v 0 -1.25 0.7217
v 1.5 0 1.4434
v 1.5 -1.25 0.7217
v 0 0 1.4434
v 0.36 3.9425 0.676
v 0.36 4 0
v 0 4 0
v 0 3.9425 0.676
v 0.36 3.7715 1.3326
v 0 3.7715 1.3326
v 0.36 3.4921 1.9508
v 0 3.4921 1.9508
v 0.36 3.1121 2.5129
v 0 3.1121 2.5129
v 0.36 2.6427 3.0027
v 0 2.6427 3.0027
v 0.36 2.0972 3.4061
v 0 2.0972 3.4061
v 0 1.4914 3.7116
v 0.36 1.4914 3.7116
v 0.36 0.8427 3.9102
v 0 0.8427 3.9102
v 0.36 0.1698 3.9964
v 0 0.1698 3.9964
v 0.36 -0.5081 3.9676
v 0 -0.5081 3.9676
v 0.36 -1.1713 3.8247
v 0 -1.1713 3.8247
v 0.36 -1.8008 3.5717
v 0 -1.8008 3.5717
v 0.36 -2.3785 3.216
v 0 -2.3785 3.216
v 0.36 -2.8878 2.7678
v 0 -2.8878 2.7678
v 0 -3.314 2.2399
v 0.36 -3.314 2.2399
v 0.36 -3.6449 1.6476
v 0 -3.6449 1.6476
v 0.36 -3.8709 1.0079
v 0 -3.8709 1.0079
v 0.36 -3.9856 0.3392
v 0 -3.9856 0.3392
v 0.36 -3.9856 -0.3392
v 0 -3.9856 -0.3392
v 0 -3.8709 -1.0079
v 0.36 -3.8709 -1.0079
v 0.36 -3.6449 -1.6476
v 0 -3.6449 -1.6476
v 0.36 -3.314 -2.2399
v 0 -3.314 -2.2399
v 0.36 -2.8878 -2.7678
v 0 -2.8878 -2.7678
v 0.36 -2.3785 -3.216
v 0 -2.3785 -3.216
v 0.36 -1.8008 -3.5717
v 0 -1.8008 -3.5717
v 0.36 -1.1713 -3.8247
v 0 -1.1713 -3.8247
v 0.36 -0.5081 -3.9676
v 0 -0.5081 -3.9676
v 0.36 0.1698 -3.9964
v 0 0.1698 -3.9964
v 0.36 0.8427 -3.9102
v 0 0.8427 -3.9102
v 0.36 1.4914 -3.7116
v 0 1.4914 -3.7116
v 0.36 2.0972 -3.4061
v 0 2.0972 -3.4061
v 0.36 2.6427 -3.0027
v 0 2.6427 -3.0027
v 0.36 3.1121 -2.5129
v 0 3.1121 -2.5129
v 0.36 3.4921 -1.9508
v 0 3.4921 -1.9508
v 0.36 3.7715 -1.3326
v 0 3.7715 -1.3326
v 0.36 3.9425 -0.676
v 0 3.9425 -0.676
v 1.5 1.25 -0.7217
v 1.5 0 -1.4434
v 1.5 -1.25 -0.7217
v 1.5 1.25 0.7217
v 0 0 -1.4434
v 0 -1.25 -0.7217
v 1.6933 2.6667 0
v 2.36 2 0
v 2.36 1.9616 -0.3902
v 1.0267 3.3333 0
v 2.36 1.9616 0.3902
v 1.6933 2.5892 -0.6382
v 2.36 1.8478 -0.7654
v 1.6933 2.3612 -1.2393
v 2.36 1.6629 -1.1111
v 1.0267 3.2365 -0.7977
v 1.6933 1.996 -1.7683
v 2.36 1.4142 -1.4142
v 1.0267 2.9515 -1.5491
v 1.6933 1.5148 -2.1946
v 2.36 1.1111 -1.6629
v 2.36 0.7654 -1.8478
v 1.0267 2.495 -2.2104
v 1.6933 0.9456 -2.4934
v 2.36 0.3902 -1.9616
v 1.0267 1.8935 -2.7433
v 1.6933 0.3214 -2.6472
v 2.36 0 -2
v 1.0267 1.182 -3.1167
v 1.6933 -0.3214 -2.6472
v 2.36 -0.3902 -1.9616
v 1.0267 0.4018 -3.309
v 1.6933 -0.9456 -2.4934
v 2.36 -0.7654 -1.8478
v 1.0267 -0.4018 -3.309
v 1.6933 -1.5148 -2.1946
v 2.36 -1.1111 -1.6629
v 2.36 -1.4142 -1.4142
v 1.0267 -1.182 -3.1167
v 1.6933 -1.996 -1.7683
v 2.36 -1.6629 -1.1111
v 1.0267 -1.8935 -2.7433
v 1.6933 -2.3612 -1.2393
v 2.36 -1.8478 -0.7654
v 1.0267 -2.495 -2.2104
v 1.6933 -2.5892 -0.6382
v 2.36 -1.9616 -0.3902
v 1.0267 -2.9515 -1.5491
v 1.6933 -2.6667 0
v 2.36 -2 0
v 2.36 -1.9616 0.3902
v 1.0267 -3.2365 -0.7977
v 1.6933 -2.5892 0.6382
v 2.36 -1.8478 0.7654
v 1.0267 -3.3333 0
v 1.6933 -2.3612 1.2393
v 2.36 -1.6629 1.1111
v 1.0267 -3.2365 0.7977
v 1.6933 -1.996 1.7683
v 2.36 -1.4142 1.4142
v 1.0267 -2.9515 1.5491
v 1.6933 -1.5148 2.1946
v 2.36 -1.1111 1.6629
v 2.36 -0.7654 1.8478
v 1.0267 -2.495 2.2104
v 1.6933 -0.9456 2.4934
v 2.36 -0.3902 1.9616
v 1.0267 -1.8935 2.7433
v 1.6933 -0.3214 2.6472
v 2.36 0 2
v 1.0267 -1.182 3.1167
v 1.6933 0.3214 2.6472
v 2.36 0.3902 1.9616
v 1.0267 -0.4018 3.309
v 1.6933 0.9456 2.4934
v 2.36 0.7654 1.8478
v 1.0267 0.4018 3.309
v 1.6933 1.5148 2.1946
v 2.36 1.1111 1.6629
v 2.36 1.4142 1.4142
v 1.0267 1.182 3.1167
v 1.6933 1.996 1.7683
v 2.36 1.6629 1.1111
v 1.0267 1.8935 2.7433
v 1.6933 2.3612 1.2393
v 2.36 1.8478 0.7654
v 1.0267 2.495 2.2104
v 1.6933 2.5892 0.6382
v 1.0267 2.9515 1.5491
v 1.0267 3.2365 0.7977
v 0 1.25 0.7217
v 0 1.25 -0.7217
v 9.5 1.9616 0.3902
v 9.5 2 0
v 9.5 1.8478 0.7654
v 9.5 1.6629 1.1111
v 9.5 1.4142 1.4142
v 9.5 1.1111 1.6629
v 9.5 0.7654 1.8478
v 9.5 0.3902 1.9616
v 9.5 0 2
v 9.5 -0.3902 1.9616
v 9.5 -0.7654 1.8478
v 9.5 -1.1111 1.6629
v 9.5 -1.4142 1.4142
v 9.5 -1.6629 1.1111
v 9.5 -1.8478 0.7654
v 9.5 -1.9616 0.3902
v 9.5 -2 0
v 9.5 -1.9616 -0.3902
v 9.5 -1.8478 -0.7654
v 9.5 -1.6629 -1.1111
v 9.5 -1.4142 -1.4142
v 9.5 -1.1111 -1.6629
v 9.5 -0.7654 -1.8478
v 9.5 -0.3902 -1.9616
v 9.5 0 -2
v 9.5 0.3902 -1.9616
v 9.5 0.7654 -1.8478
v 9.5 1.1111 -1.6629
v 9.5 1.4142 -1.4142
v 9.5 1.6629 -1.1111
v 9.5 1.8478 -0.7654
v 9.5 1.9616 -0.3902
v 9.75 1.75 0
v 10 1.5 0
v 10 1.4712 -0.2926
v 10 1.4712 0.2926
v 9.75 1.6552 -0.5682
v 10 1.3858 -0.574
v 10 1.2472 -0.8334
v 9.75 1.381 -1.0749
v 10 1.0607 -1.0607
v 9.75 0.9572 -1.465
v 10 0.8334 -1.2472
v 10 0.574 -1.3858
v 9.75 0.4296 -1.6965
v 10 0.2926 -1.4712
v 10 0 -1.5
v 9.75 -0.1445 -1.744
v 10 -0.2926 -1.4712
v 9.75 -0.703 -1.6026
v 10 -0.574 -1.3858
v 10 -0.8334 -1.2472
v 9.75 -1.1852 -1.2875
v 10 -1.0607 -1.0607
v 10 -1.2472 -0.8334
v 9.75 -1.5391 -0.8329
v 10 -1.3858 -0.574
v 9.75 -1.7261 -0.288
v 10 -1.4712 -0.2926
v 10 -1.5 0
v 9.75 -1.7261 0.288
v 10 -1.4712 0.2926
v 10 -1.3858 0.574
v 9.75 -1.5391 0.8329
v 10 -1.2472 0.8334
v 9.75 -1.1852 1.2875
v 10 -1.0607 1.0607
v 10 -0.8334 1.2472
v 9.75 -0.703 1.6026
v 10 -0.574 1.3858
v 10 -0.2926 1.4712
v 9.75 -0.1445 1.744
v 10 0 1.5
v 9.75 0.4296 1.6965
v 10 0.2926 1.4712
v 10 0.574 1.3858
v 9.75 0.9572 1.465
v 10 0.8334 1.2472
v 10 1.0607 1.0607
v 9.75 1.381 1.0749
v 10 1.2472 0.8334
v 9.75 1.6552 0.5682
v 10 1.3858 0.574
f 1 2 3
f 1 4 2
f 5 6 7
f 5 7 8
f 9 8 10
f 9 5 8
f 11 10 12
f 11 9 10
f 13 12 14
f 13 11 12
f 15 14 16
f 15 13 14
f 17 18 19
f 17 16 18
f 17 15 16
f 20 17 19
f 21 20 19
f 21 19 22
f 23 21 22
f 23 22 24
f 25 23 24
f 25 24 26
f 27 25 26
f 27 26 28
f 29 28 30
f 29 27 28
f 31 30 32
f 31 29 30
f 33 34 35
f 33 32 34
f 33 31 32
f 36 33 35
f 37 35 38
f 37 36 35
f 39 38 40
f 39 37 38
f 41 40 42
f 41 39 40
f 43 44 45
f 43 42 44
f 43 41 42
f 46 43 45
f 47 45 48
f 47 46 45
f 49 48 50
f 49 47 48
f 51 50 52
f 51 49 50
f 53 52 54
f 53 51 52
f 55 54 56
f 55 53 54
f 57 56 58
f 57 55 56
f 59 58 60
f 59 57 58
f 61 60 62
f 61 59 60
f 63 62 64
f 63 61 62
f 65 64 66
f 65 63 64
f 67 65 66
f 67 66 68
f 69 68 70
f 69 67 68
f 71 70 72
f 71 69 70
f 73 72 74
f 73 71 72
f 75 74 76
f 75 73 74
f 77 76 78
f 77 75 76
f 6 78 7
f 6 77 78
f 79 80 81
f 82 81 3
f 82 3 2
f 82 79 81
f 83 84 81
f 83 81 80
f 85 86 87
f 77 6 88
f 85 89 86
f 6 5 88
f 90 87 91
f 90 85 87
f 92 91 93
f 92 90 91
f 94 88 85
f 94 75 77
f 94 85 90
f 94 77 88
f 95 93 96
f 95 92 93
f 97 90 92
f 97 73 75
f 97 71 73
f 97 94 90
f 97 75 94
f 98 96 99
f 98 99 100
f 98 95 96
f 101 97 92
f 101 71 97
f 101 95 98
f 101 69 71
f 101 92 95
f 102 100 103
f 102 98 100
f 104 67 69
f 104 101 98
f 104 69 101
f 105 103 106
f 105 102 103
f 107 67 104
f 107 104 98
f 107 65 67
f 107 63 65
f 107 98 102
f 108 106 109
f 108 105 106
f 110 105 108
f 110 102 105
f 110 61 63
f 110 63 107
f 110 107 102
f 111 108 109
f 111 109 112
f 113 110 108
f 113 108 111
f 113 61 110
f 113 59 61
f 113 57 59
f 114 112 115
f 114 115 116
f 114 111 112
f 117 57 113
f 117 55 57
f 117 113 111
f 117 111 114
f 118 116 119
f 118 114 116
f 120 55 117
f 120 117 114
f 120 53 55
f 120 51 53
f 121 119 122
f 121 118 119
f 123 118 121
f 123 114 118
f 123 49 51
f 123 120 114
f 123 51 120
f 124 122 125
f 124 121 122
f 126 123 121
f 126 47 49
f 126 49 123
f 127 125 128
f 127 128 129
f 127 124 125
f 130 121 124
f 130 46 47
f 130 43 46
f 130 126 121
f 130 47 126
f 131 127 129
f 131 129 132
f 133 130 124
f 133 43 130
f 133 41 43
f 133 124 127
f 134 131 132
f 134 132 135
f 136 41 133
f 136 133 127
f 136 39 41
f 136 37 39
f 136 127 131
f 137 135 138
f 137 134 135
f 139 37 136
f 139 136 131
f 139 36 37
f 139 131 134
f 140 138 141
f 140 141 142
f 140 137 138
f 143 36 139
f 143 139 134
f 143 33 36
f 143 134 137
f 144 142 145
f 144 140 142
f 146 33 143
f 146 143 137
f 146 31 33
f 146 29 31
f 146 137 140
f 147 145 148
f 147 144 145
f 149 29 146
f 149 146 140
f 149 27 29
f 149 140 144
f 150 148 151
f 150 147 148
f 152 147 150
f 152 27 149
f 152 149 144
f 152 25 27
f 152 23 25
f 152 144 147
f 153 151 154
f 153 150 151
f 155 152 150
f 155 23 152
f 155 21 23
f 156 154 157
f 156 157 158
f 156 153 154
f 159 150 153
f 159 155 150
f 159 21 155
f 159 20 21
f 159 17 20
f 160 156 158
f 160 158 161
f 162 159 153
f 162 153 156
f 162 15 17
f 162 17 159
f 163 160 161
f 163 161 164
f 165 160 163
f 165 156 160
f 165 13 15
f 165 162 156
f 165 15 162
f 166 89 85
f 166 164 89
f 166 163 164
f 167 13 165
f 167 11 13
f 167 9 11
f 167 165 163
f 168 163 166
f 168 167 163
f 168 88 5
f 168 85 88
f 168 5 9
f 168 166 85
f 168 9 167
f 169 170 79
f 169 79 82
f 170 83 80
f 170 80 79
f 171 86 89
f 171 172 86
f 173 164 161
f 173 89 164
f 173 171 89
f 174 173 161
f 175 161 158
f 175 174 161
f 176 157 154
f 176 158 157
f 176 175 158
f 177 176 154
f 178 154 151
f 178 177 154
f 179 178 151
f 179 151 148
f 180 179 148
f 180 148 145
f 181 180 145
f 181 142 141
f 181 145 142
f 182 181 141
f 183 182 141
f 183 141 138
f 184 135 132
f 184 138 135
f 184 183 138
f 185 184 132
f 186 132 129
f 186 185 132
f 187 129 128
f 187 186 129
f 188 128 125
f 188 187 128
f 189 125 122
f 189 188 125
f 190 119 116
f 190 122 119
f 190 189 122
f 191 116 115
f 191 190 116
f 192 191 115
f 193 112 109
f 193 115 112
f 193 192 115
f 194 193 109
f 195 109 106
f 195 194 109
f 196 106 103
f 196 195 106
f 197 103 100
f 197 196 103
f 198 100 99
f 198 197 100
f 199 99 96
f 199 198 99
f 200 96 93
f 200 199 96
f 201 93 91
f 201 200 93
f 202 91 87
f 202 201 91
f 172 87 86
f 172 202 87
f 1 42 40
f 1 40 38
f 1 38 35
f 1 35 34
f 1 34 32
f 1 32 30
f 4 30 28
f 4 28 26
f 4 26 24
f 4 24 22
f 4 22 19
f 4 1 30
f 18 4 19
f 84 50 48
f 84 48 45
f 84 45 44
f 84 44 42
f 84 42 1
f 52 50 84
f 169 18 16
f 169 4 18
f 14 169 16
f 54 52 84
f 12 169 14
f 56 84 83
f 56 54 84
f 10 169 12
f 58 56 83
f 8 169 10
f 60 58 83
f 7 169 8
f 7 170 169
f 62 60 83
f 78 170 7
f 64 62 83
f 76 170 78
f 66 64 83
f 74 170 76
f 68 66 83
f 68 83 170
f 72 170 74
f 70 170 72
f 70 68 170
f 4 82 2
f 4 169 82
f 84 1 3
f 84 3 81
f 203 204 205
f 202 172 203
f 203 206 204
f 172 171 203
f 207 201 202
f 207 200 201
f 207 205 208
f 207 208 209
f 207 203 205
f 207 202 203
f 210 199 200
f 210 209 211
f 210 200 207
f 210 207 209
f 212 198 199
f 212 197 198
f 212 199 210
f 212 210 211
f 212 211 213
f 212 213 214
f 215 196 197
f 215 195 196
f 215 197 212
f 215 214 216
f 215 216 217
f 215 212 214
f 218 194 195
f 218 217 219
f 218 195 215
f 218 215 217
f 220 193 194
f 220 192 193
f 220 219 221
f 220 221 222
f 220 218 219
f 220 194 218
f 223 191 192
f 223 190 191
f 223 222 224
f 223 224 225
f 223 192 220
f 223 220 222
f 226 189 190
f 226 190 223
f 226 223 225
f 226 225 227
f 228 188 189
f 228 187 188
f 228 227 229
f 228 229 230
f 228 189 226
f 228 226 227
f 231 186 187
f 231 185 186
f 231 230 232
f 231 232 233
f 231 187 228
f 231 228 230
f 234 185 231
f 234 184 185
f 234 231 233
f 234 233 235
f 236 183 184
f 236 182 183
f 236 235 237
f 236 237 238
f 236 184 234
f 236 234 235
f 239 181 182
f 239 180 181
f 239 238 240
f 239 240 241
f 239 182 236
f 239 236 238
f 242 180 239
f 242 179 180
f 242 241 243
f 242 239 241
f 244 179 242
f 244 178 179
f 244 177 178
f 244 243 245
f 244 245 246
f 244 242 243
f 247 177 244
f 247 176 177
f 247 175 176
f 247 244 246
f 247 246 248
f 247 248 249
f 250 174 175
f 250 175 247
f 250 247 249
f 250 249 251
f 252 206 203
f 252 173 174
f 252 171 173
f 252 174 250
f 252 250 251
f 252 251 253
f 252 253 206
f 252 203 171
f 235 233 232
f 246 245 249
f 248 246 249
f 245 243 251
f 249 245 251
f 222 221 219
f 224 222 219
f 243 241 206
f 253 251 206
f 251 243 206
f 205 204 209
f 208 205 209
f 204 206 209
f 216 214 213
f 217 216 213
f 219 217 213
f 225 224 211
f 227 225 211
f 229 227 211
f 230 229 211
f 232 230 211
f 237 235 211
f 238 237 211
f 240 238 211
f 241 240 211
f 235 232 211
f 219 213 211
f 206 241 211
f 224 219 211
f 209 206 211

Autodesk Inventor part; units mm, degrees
ref_plane "YZ Plane" through (0, 0, 0) normal (1, 0, 0) x (0, 1, 0)
ref_plane "XZ Plane" through (0, 0, 0) normal (0, 1, 0) x (-1, 0, 0)
ref_plane "XY Plane" through (0, 0, 0) normal (0, 0, 1) x (1, 0, 0)
sketch "Sketch1" plane through (0, 0, 0) normal (0, 0, 1) x (1, 0, 0)
  line L0 (0, 0) -> (0, 4)
  line L1 (0, 4) -> (0.36, 4)
  line L2 (0.36, 4) -> (2.36, 2)
  line L3 (2.36, 2) -> (10, 2)
  line L4 (10, 2) -> (10, 0)
  line L5 (10, 0) -> (0, 0)
  dimension "d0" = 4
  dimension "d1" = 0.36
  dimension "d2" = 135
  dimension "d3" = 10
  dimension "d4" = 2
revolve "Revolution1" add sketch "Sketch1" angle 360 about axis through (10, 0, 0) along (-1, 0, 0)
chamfer "Chamfer1" distance 0.5 angle 45 1 edges at (10, -2, 0)
sketch "Sketch2" plane through (0, 0, 0) normal (-1, 0, 0) x (0, 0, 1)
  circle A0 centre (0, 0) radius 4 projected
  line L0 (-1.4434, 0) -> (-0.7217, 1.25)
  line L1 (-0.7217, 1.25) -> (0.7217, 1.25)
  line L2 (0.7217, 1.25) -> (1.4434, 0)
  line L3 (1.4434, 0) -> (0.7217, -1.25)
  line L4 (0.7217, -1.25) -> (-0.7217, -1.25)
  line L5 (-0.7217, -1.25) -> (-1.4434, 0)
  dimension "d9" = 2.5
extrude "Extrusion1" cut sketch "Sketch2" against normal blind 1.5 contours L0 L1 L2 L3 L4 L5
thread "Thread1" size "M4x0.7" class "6g" standard "ANSI Metric M Profile" full length
properties part number "FHS4x10" material "Steel, Alloy"
